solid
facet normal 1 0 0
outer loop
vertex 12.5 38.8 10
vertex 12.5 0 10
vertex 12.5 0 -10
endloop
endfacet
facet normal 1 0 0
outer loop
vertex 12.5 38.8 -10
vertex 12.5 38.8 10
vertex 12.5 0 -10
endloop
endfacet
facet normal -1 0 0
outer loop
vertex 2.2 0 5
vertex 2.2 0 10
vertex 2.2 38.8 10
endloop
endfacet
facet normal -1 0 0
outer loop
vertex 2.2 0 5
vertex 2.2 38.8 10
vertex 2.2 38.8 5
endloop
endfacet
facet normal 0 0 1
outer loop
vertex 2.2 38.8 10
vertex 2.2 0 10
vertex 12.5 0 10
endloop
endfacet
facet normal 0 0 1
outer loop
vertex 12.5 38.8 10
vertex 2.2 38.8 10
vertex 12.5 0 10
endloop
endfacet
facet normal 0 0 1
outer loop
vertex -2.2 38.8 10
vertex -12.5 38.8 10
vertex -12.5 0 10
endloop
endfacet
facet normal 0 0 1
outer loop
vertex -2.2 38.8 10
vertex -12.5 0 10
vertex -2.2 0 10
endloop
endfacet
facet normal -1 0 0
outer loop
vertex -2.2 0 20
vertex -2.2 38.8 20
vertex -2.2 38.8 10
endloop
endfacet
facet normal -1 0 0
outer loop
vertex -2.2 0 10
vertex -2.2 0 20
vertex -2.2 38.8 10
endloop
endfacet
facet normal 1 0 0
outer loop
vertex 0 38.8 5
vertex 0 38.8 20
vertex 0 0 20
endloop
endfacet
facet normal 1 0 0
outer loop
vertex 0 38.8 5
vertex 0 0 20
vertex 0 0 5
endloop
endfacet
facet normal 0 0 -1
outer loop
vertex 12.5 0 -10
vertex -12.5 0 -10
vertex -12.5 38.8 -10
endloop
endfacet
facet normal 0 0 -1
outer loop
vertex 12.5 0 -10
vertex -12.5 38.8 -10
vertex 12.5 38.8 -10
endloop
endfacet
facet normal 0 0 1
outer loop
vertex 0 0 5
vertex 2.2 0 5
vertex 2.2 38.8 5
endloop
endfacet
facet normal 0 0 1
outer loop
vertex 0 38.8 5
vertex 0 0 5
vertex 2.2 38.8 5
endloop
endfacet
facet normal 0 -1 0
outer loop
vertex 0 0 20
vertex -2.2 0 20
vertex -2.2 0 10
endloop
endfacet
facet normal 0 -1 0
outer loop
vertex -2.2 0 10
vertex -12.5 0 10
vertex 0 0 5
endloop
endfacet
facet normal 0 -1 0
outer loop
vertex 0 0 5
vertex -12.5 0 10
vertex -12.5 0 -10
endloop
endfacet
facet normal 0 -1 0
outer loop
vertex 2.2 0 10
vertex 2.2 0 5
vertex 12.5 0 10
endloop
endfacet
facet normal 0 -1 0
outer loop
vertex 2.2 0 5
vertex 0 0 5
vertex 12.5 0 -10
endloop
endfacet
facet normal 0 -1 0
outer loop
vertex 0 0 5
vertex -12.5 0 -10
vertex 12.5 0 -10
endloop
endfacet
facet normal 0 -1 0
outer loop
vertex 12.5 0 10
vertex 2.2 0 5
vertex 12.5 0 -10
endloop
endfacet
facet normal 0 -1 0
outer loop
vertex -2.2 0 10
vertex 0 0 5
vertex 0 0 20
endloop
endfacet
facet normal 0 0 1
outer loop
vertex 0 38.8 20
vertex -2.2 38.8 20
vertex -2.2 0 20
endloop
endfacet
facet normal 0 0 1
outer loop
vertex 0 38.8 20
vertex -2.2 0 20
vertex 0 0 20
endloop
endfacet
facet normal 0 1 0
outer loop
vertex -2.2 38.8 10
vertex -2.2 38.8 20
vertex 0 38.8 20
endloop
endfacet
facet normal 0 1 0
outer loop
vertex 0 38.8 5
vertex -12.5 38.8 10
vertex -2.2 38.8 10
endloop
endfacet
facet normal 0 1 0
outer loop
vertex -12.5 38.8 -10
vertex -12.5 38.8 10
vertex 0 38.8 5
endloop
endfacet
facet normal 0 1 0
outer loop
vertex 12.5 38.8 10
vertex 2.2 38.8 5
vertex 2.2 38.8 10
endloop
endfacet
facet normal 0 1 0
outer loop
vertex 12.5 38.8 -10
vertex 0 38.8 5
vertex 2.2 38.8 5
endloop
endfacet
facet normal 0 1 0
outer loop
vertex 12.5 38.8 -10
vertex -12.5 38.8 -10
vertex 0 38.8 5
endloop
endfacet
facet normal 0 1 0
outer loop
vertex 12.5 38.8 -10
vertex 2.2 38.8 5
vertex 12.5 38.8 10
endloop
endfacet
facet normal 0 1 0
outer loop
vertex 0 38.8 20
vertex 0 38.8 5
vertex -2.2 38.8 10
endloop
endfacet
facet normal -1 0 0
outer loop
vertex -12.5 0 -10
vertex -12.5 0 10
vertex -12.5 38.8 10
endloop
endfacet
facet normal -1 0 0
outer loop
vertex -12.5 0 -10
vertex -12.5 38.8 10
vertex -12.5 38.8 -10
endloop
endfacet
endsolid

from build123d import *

# Parameters (mm, degrees)
SKETCH_1_W          = 25
SKETCH_1_H          = 20
EXTRUDE_1_DEPTH     = 38.8
SKETCH_3_W          = 4.4
SKETCH_3_H          = 10
EXTRUDE_2_DEPTH     = 38.8
SKETCH_5_W          = 15
SKETCH_5_H          = 38.8
CUT_EXTRUDE_2_DEPTH = 2.2


with BuildPart() as part:
    # 草圖1 → 填料-伸長1 (new body)
    with BuildSketch(Plane(origin=(0, 0, 0), x_dir=(1, 0, 0), z_dir=(0, 1, 0))):
        Rectangle(SKETCH_1_W, SKETCH_1_H)
    extrude(amount=EXTRUDE_1_DEPTH)

    # 草圖3 → 填料-伸長2 (add)
    with BuildSketch(Plane(origin=(0, 38.8, 0), x_dir=(1, 0, 0), z_dir=(0, 1, 0))):
        with Locations((0, -15)):
            Rectangle(SKETCH_3_W, SKETCH_3_H)
    extrude(amount=-EXTRUDE_2_DEPTH)

    # 草圖5 → 除料-伸長2 (cut)
    with BuildSketch(Plane(origin=(2.2, 0, 0), x_dir=(0, 0, -1), z_dir=(1, 0, 0))):
        with Locations((-12.5, 19.4)):
            Rectangle(SKETCH_5_W, SKETCH_5_H)
    extrude(amount=-CUT_EXTRUDE_2_DEPTH, mode=Mode.SUBTRACT)


solid = part.part
